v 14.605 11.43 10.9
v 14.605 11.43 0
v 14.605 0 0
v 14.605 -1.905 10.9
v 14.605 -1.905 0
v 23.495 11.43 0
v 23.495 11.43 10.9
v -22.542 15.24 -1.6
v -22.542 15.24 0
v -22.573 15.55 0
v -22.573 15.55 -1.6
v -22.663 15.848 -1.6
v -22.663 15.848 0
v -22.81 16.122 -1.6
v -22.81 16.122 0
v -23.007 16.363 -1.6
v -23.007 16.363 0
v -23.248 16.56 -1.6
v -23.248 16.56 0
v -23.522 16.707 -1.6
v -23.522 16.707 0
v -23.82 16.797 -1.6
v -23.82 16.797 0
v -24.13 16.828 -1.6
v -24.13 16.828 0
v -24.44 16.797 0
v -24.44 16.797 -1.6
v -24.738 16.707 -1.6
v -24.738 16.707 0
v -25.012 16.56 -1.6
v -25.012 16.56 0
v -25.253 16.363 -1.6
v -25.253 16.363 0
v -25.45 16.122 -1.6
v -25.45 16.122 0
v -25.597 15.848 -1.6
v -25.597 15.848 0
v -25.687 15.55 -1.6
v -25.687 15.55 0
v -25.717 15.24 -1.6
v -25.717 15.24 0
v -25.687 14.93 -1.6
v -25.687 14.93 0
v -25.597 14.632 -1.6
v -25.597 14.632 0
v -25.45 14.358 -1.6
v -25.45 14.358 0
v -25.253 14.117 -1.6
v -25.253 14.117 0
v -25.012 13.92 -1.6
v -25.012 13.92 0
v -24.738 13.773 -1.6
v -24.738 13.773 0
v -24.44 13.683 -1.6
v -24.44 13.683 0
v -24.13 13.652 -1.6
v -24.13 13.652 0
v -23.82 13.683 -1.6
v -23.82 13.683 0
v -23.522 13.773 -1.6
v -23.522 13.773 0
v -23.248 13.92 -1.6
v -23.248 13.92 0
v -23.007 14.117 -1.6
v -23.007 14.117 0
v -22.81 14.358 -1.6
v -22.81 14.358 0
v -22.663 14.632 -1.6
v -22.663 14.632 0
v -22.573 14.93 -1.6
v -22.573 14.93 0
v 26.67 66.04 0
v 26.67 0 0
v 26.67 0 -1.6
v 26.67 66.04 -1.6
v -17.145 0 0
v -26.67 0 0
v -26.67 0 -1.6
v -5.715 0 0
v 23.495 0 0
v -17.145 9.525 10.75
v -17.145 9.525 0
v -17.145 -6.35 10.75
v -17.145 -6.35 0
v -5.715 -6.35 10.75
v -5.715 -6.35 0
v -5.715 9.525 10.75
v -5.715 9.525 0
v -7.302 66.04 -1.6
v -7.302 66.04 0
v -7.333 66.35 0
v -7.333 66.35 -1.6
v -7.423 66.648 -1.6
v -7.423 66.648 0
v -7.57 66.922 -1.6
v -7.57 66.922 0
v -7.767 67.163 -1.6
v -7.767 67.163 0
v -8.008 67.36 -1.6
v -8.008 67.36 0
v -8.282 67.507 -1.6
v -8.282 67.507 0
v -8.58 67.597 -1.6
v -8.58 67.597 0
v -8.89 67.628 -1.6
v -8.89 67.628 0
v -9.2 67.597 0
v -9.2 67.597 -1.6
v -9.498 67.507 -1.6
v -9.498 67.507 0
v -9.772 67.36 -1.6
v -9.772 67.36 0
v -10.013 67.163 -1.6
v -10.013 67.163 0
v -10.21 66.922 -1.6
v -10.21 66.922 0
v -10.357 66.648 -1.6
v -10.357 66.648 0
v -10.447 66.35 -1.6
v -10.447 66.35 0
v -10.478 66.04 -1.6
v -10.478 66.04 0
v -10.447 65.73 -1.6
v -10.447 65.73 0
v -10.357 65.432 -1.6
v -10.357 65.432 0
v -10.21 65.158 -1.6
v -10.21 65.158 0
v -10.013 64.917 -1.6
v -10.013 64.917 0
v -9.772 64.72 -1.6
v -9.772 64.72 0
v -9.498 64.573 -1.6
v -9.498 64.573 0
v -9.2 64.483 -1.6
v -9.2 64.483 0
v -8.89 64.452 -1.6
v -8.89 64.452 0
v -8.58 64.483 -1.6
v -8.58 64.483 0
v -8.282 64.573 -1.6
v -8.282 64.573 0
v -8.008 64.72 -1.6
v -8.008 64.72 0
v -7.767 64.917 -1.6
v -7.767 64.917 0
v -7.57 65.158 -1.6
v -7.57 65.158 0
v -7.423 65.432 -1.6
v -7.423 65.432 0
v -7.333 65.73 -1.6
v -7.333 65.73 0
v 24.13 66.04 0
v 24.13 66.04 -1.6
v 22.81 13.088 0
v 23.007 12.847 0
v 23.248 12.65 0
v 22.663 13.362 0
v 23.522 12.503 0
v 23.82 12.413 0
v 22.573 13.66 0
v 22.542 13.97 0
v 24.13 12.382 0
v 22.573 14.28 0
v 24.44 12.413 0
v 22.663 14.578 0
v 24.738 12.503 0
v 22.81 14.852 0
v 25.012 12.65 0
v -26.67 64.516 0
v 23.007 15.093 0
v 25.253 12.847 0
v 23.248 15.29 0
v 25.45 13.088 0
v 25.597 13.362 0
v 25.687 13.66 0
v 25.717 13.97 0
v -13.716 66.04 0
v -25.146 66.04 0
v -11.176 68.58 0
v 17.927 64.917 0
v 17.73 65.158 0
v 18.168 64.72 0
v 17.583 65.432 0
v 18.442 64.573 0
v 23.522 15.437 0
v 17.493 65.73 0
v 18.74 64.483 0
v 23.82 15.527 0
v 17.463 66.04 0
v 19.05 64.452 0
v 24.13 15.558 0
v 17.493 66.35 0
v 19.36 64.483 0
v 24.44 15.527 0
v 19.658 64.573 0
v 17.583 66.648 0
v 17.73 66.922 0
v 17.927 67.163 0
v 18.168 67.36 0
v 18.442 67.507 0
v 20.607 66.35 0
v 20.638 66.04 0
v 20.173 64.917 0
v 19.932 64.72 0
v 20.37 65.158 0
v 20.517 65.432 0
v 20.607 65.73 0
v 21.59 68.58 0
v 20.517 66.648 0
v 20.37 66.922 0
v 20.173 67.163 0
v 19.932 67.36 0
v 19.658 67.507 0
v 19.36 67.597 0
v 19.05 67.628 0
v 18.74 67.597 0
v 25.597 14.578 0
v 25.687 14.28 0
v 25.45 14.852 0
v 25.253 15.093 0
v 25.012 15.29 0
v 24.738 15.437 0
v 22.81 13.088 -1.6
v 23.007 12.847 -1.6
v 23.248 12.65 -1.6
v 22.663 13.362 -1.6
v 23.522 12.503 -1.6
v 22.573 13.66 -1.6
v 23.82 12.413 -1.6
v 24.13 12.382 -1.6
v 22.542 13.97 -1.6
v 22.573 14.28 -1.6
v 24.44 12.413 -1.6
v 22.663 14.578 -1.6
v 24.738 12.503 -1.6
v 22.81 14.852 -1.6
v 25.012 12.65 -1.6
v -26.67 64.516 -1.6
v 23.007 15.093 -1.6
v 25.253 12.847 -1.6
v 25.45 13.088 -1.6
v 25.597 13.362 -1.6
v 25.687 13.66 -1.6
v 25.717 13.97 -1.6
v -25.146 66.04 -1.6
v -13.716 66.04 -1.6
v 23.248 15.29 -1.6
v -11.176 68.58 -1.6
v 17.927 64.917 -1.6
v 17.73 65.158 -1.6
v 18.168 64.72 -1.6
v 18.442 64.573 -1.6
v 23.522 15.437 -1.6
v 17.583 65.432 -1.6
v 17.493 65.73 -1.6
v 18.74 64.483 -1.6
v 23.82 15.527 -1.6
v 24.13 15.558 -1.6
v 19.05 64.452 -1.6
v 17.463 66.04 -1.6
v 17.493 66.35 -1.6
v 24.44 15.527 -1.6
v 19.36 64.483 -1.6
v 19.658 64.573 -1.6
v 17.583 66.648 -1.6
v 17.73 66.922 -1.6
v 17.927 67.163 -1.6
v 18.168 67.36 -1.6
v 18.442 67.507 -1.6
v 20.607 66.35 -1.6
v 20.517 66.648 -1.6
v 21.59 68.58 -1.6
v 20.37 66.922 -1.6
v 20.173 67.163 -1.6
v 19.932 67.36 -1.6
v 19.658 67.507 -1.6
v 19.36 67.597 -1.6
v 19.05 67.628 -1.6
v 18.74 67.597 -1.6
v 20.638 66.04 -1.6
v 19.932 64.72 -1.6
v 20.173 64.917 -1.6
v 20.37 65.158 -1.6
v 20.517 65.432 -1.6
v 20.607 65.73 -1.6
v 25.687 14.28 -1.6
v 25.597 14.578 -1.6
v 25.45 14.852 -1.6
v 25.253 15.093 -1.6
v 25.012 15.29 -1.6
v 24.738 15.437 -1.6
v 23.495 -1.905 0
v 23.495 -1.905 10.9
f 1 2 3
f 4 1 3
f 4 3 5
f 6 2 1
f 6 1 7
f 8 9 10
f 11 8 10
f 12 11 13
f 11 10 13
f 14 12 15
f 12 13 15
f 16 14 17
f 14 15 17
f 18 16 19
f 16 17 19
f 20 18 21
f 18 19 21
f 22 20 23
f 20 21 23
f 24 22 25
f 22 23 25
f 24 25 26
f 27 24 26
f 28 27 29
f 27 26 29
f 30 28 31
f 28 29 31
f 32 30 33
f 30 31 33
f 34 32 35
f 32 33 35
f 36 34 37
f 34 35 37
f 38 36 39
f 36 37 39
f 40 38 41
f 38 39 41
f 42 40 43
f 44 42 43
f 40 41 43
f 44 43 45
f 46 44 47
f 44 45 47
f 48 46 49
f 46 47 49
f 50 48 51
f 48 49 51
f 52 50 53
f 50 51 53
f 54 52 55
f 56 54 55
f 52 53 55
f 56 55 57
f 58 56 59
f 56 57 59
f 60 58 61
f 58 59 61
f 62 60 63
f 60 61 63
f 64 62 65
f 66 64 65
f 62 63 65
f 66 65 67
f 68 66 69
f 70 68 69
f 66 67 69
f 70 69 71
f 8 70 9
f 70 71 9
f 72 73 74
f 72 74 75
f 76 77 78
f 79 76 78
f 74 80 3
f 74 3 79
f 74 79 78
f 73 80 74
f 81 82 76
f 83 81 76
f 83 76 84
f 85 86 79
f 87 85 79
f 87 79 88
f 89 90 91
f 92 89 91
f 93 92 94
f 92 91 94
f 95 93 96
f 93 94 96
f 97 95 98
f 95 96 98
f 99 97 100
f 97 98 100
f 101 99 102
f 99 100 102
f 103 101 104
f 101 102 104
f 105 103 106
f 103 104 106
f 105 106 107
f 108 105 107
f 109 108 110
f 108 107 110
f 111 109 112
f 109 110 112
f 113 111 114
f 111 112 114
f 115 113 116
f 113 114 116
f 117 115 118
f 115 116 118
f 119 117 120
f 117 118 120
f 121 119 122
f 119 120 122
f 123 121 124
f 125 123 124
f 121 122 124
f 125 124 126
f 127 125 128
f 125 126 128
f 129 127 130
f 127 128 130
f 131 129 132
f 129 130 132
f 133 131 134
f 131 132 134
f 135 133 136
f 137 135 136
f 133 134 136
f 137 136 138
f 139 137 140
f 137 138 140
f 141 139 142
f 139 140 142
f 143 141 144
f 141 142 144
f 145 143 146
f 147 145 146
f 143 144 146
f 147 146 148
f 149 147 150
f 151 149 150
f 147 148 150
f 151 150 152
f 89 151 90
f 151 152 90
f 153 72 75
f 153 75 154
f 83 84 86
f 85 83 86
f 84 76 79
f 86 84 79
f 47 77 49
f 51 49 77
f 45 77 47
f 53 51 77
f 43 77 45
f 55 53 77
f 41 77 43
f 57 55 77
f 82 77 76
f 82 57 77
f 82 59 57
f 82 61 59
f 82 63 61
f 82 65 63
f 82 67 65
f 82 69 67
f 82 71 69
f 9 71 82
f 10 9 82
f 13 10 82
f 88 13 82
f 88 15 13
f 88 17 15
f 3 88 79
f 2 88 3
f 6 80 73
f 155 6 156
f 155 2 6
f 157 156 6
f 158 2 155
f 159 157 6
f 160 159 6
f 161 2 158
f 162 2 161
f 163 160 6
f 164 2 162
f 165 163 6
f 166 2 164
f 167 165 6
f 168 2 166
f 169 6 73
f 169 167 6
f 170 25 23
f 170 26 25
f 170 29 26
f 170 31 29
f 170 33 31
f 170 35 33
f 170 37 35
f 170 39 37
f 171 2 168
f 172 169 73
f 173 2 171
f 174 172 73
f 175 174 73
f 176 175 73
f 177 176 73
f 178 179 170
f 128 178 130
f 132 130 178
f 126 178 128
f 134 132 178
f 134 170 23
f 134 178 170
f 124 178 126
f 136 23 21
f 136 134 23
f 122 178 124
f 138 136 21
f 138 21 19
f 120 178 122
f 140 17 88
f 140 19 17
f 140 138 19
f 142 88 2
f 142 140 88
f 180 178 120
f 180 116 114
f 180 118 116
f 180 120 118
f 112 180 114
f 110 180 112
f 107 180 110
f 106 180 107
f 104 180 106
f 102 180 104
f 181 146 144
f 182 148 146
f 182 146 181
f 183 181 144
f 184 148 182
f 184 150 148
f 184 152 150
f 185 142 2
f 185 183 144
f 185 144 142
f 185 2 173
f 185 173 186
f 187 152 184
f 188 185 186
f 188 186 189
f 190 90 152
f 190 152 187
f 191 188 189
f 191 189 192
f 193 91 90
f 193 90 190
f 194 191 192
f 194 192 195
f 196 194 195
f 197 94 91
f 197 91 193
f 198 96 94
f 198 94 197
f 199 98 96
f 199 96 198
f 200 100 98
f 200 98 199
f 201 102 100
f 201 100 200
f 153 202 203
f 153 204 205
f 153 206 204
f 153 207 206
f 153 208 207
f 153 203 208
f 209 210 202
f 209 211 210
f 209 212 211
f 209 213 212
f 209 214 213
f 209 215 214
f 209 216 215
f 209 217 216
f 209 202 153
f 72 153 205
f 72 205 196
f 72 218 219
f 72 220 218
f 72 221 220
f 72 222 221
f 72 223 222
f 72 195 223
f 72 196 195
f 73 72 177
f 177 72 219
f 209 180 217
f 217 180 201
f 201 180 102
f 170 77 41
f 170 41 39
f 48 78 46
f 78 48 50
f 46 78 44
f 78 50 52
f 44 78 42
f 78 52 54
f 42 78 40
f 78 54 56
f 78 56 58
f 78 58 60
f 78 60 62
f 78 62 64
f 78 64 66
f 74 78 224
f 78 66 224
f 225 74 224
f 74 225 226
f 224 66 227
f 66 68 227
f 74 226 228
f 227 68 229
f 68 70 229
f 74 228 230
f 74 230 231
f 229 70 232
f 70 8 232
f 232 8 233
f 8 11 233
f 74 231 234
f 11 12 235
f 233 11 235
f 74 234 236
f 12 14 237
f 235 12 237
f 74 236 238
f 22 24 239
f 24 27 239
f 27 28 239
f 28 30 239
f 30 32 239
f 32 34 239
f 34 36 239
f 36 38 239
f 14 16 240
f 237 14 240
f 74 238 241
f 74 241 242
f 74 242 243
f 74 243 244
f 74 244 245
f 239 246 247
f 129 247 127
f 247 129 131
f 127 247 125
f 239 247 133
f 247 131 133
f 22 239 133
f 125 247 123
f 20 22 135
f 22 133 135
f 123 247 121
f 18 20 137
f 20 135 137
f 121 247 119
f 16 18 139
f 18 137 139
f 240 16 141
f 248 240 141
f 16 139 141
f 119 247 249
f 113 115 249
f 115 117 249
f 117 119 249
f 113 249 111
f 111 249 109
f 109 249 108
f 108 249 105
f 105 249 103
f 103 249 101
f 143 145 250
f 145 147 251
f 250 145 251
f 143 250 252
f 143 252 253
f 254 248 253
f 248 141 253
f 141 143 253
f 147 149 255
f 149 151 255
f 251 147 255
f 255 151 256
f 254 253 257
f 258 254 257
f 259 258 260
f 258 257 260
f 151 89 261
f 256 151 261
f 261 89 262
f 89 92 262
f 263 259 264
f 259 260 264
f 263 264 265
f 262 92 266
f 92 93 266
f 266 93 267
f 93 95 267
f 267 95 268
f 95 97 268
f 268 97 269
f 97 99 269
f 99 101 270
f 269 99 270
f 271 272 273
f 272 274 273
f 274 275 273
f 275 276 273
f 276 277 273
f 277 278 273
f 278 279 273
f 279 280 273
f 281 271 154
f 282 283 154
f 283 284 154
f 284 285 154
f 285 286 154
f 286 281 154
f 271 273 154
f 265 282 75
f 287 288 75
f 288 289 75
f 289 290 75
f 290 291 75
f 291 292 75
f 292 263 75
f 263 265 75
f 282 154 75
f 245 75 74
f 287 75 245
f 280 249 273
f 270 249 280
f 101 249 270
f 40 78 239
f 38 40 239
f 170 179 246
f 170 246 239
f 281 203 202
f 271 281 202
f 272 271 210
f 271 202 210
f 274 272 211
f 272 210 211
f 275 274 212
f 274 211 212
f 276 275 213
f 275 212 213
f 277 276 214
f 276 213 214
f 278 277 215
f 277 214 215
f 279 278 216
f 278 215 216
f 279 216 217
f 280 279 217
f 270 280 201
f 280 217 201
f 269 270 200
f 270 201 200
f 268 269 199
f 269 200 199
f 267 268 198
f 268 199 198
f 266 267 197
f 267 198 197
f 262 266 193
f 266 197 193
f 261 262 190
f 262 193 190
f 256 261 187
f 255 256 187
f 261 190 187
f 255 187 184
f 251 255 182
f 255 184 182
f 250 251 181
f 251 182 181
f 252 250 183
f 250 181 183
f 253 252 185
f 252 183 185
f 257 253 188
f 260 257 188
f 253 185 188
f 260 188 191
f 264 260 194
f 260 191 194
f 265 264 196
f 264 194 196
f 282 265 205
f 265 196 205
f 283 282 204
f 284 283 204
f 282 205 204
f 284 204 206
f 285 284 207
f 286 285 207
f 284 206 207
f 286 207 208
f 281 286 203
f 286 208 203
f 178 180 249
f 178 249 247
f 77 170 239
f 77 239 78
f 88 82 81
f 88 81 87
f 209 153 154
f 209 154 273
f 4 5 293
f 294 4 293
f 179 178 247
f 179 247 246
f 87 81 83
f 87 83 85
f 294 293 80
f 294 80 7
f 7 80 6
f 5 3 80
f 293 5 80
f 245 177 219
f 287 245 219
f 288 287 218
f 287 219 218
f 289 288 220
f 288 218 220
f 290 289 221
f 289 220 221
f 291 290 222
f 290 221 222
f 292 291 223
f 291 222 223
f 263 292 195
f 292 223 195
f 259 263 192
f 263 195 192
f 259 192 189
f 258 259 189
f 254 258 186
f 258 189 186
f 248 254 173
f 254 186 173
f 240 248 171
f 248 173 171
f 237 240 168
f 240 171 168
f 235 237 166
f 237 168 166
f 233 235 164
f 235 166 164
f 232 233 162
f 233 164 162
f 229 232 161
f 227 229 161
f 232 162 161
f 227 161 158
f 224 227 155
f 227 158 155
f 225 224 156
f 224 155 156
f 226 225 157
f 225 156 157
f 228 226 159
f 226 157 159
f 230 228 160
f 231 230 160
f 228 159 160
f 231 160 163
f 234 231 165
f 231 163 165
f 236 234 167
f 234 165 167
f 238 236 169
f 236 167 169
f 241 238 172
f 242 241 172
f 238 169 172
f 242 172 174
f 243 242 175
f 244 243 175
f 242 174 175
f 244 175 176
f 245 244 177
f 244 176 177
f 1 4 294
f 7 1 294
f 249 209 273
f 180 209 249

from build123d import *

# Parameters (mm, degrees)
F0_R     = 1.5875
F0_W     = 8.89
F0_H     = 11.43
F0_W_2   = 11.43
F0_H_2   = 9.525
F1_DEPTH = 1.6
F0_H_3   = 1.905
F2_DEPTH = 10.9
F0_H_4   = 6.35
F3_DEPTH = 10.75


with BuildPart() as f1:
    # F0 (on Top) → F1 (new body)
    with BuildSketch(Plane.XY):
        Polygon((23.495, 0), (26.67, 0), (26.67, 66.04), (24.13, 66.04), (21.59, 68.58), (-11.176, 68.58), (-13.716, 66.04), (-25.146, 66.04), (-26.67, 64.516), (-26.67, 0), (-17.145, 0), (-17.145, 9.525), (-5.715, 9.525), (-5.715, 0), (14.605, 0), (14.605, 11.43), (23.495, 11.43), align=None)
        with Locations((-24.13, 15.24)):
            Circle(F0_R, mode=Mode.SUBTRACT)
        with Locations((24.13, 13.97)):
            Circle(F0_R, mode=Mode.SUBTRACT)
        with Locations((-8.89, 66.04)):
            Circle(F0_R, mode=Mode.SUBTRACT)
        with Locations((19.05, 66.04)):
            Circle(F0_R, mode=Mode.SUBTRACT)
        with Locations((19.05, 5.715)):
            Rectangle(F0_W, F0_H)
        with Locations((-11.43, 4.7625)):
            Rectangle(F0_W_2, F0_H_2)
    extrude(amount=-F1_DEPTH)

    # F0 (on Top) → F2 (join)
    with BuildSketch(Plane.XY):
        with Locations((19.05, 5.715)):
            Rectangle(F0_W, F0_H)
        with Locations((19.05, -0.9525)):
            Rectangle(F0_W, F0_H_3)
    extrude(amount=F2_DEPTH)

    # F0 (on Top) → F3 (join)
    with BuildSketch(Plane.XY):
        with Locations((-11.43, 4.7625)):
            Rectangle(F0_W_2, F0_H_2)
        with Locations((-11.43, -3.175)):
            Rectangle(F0_W_2, F0_H_4)
    extrude(amount=F3_DEPTH)


solid = f1.part
